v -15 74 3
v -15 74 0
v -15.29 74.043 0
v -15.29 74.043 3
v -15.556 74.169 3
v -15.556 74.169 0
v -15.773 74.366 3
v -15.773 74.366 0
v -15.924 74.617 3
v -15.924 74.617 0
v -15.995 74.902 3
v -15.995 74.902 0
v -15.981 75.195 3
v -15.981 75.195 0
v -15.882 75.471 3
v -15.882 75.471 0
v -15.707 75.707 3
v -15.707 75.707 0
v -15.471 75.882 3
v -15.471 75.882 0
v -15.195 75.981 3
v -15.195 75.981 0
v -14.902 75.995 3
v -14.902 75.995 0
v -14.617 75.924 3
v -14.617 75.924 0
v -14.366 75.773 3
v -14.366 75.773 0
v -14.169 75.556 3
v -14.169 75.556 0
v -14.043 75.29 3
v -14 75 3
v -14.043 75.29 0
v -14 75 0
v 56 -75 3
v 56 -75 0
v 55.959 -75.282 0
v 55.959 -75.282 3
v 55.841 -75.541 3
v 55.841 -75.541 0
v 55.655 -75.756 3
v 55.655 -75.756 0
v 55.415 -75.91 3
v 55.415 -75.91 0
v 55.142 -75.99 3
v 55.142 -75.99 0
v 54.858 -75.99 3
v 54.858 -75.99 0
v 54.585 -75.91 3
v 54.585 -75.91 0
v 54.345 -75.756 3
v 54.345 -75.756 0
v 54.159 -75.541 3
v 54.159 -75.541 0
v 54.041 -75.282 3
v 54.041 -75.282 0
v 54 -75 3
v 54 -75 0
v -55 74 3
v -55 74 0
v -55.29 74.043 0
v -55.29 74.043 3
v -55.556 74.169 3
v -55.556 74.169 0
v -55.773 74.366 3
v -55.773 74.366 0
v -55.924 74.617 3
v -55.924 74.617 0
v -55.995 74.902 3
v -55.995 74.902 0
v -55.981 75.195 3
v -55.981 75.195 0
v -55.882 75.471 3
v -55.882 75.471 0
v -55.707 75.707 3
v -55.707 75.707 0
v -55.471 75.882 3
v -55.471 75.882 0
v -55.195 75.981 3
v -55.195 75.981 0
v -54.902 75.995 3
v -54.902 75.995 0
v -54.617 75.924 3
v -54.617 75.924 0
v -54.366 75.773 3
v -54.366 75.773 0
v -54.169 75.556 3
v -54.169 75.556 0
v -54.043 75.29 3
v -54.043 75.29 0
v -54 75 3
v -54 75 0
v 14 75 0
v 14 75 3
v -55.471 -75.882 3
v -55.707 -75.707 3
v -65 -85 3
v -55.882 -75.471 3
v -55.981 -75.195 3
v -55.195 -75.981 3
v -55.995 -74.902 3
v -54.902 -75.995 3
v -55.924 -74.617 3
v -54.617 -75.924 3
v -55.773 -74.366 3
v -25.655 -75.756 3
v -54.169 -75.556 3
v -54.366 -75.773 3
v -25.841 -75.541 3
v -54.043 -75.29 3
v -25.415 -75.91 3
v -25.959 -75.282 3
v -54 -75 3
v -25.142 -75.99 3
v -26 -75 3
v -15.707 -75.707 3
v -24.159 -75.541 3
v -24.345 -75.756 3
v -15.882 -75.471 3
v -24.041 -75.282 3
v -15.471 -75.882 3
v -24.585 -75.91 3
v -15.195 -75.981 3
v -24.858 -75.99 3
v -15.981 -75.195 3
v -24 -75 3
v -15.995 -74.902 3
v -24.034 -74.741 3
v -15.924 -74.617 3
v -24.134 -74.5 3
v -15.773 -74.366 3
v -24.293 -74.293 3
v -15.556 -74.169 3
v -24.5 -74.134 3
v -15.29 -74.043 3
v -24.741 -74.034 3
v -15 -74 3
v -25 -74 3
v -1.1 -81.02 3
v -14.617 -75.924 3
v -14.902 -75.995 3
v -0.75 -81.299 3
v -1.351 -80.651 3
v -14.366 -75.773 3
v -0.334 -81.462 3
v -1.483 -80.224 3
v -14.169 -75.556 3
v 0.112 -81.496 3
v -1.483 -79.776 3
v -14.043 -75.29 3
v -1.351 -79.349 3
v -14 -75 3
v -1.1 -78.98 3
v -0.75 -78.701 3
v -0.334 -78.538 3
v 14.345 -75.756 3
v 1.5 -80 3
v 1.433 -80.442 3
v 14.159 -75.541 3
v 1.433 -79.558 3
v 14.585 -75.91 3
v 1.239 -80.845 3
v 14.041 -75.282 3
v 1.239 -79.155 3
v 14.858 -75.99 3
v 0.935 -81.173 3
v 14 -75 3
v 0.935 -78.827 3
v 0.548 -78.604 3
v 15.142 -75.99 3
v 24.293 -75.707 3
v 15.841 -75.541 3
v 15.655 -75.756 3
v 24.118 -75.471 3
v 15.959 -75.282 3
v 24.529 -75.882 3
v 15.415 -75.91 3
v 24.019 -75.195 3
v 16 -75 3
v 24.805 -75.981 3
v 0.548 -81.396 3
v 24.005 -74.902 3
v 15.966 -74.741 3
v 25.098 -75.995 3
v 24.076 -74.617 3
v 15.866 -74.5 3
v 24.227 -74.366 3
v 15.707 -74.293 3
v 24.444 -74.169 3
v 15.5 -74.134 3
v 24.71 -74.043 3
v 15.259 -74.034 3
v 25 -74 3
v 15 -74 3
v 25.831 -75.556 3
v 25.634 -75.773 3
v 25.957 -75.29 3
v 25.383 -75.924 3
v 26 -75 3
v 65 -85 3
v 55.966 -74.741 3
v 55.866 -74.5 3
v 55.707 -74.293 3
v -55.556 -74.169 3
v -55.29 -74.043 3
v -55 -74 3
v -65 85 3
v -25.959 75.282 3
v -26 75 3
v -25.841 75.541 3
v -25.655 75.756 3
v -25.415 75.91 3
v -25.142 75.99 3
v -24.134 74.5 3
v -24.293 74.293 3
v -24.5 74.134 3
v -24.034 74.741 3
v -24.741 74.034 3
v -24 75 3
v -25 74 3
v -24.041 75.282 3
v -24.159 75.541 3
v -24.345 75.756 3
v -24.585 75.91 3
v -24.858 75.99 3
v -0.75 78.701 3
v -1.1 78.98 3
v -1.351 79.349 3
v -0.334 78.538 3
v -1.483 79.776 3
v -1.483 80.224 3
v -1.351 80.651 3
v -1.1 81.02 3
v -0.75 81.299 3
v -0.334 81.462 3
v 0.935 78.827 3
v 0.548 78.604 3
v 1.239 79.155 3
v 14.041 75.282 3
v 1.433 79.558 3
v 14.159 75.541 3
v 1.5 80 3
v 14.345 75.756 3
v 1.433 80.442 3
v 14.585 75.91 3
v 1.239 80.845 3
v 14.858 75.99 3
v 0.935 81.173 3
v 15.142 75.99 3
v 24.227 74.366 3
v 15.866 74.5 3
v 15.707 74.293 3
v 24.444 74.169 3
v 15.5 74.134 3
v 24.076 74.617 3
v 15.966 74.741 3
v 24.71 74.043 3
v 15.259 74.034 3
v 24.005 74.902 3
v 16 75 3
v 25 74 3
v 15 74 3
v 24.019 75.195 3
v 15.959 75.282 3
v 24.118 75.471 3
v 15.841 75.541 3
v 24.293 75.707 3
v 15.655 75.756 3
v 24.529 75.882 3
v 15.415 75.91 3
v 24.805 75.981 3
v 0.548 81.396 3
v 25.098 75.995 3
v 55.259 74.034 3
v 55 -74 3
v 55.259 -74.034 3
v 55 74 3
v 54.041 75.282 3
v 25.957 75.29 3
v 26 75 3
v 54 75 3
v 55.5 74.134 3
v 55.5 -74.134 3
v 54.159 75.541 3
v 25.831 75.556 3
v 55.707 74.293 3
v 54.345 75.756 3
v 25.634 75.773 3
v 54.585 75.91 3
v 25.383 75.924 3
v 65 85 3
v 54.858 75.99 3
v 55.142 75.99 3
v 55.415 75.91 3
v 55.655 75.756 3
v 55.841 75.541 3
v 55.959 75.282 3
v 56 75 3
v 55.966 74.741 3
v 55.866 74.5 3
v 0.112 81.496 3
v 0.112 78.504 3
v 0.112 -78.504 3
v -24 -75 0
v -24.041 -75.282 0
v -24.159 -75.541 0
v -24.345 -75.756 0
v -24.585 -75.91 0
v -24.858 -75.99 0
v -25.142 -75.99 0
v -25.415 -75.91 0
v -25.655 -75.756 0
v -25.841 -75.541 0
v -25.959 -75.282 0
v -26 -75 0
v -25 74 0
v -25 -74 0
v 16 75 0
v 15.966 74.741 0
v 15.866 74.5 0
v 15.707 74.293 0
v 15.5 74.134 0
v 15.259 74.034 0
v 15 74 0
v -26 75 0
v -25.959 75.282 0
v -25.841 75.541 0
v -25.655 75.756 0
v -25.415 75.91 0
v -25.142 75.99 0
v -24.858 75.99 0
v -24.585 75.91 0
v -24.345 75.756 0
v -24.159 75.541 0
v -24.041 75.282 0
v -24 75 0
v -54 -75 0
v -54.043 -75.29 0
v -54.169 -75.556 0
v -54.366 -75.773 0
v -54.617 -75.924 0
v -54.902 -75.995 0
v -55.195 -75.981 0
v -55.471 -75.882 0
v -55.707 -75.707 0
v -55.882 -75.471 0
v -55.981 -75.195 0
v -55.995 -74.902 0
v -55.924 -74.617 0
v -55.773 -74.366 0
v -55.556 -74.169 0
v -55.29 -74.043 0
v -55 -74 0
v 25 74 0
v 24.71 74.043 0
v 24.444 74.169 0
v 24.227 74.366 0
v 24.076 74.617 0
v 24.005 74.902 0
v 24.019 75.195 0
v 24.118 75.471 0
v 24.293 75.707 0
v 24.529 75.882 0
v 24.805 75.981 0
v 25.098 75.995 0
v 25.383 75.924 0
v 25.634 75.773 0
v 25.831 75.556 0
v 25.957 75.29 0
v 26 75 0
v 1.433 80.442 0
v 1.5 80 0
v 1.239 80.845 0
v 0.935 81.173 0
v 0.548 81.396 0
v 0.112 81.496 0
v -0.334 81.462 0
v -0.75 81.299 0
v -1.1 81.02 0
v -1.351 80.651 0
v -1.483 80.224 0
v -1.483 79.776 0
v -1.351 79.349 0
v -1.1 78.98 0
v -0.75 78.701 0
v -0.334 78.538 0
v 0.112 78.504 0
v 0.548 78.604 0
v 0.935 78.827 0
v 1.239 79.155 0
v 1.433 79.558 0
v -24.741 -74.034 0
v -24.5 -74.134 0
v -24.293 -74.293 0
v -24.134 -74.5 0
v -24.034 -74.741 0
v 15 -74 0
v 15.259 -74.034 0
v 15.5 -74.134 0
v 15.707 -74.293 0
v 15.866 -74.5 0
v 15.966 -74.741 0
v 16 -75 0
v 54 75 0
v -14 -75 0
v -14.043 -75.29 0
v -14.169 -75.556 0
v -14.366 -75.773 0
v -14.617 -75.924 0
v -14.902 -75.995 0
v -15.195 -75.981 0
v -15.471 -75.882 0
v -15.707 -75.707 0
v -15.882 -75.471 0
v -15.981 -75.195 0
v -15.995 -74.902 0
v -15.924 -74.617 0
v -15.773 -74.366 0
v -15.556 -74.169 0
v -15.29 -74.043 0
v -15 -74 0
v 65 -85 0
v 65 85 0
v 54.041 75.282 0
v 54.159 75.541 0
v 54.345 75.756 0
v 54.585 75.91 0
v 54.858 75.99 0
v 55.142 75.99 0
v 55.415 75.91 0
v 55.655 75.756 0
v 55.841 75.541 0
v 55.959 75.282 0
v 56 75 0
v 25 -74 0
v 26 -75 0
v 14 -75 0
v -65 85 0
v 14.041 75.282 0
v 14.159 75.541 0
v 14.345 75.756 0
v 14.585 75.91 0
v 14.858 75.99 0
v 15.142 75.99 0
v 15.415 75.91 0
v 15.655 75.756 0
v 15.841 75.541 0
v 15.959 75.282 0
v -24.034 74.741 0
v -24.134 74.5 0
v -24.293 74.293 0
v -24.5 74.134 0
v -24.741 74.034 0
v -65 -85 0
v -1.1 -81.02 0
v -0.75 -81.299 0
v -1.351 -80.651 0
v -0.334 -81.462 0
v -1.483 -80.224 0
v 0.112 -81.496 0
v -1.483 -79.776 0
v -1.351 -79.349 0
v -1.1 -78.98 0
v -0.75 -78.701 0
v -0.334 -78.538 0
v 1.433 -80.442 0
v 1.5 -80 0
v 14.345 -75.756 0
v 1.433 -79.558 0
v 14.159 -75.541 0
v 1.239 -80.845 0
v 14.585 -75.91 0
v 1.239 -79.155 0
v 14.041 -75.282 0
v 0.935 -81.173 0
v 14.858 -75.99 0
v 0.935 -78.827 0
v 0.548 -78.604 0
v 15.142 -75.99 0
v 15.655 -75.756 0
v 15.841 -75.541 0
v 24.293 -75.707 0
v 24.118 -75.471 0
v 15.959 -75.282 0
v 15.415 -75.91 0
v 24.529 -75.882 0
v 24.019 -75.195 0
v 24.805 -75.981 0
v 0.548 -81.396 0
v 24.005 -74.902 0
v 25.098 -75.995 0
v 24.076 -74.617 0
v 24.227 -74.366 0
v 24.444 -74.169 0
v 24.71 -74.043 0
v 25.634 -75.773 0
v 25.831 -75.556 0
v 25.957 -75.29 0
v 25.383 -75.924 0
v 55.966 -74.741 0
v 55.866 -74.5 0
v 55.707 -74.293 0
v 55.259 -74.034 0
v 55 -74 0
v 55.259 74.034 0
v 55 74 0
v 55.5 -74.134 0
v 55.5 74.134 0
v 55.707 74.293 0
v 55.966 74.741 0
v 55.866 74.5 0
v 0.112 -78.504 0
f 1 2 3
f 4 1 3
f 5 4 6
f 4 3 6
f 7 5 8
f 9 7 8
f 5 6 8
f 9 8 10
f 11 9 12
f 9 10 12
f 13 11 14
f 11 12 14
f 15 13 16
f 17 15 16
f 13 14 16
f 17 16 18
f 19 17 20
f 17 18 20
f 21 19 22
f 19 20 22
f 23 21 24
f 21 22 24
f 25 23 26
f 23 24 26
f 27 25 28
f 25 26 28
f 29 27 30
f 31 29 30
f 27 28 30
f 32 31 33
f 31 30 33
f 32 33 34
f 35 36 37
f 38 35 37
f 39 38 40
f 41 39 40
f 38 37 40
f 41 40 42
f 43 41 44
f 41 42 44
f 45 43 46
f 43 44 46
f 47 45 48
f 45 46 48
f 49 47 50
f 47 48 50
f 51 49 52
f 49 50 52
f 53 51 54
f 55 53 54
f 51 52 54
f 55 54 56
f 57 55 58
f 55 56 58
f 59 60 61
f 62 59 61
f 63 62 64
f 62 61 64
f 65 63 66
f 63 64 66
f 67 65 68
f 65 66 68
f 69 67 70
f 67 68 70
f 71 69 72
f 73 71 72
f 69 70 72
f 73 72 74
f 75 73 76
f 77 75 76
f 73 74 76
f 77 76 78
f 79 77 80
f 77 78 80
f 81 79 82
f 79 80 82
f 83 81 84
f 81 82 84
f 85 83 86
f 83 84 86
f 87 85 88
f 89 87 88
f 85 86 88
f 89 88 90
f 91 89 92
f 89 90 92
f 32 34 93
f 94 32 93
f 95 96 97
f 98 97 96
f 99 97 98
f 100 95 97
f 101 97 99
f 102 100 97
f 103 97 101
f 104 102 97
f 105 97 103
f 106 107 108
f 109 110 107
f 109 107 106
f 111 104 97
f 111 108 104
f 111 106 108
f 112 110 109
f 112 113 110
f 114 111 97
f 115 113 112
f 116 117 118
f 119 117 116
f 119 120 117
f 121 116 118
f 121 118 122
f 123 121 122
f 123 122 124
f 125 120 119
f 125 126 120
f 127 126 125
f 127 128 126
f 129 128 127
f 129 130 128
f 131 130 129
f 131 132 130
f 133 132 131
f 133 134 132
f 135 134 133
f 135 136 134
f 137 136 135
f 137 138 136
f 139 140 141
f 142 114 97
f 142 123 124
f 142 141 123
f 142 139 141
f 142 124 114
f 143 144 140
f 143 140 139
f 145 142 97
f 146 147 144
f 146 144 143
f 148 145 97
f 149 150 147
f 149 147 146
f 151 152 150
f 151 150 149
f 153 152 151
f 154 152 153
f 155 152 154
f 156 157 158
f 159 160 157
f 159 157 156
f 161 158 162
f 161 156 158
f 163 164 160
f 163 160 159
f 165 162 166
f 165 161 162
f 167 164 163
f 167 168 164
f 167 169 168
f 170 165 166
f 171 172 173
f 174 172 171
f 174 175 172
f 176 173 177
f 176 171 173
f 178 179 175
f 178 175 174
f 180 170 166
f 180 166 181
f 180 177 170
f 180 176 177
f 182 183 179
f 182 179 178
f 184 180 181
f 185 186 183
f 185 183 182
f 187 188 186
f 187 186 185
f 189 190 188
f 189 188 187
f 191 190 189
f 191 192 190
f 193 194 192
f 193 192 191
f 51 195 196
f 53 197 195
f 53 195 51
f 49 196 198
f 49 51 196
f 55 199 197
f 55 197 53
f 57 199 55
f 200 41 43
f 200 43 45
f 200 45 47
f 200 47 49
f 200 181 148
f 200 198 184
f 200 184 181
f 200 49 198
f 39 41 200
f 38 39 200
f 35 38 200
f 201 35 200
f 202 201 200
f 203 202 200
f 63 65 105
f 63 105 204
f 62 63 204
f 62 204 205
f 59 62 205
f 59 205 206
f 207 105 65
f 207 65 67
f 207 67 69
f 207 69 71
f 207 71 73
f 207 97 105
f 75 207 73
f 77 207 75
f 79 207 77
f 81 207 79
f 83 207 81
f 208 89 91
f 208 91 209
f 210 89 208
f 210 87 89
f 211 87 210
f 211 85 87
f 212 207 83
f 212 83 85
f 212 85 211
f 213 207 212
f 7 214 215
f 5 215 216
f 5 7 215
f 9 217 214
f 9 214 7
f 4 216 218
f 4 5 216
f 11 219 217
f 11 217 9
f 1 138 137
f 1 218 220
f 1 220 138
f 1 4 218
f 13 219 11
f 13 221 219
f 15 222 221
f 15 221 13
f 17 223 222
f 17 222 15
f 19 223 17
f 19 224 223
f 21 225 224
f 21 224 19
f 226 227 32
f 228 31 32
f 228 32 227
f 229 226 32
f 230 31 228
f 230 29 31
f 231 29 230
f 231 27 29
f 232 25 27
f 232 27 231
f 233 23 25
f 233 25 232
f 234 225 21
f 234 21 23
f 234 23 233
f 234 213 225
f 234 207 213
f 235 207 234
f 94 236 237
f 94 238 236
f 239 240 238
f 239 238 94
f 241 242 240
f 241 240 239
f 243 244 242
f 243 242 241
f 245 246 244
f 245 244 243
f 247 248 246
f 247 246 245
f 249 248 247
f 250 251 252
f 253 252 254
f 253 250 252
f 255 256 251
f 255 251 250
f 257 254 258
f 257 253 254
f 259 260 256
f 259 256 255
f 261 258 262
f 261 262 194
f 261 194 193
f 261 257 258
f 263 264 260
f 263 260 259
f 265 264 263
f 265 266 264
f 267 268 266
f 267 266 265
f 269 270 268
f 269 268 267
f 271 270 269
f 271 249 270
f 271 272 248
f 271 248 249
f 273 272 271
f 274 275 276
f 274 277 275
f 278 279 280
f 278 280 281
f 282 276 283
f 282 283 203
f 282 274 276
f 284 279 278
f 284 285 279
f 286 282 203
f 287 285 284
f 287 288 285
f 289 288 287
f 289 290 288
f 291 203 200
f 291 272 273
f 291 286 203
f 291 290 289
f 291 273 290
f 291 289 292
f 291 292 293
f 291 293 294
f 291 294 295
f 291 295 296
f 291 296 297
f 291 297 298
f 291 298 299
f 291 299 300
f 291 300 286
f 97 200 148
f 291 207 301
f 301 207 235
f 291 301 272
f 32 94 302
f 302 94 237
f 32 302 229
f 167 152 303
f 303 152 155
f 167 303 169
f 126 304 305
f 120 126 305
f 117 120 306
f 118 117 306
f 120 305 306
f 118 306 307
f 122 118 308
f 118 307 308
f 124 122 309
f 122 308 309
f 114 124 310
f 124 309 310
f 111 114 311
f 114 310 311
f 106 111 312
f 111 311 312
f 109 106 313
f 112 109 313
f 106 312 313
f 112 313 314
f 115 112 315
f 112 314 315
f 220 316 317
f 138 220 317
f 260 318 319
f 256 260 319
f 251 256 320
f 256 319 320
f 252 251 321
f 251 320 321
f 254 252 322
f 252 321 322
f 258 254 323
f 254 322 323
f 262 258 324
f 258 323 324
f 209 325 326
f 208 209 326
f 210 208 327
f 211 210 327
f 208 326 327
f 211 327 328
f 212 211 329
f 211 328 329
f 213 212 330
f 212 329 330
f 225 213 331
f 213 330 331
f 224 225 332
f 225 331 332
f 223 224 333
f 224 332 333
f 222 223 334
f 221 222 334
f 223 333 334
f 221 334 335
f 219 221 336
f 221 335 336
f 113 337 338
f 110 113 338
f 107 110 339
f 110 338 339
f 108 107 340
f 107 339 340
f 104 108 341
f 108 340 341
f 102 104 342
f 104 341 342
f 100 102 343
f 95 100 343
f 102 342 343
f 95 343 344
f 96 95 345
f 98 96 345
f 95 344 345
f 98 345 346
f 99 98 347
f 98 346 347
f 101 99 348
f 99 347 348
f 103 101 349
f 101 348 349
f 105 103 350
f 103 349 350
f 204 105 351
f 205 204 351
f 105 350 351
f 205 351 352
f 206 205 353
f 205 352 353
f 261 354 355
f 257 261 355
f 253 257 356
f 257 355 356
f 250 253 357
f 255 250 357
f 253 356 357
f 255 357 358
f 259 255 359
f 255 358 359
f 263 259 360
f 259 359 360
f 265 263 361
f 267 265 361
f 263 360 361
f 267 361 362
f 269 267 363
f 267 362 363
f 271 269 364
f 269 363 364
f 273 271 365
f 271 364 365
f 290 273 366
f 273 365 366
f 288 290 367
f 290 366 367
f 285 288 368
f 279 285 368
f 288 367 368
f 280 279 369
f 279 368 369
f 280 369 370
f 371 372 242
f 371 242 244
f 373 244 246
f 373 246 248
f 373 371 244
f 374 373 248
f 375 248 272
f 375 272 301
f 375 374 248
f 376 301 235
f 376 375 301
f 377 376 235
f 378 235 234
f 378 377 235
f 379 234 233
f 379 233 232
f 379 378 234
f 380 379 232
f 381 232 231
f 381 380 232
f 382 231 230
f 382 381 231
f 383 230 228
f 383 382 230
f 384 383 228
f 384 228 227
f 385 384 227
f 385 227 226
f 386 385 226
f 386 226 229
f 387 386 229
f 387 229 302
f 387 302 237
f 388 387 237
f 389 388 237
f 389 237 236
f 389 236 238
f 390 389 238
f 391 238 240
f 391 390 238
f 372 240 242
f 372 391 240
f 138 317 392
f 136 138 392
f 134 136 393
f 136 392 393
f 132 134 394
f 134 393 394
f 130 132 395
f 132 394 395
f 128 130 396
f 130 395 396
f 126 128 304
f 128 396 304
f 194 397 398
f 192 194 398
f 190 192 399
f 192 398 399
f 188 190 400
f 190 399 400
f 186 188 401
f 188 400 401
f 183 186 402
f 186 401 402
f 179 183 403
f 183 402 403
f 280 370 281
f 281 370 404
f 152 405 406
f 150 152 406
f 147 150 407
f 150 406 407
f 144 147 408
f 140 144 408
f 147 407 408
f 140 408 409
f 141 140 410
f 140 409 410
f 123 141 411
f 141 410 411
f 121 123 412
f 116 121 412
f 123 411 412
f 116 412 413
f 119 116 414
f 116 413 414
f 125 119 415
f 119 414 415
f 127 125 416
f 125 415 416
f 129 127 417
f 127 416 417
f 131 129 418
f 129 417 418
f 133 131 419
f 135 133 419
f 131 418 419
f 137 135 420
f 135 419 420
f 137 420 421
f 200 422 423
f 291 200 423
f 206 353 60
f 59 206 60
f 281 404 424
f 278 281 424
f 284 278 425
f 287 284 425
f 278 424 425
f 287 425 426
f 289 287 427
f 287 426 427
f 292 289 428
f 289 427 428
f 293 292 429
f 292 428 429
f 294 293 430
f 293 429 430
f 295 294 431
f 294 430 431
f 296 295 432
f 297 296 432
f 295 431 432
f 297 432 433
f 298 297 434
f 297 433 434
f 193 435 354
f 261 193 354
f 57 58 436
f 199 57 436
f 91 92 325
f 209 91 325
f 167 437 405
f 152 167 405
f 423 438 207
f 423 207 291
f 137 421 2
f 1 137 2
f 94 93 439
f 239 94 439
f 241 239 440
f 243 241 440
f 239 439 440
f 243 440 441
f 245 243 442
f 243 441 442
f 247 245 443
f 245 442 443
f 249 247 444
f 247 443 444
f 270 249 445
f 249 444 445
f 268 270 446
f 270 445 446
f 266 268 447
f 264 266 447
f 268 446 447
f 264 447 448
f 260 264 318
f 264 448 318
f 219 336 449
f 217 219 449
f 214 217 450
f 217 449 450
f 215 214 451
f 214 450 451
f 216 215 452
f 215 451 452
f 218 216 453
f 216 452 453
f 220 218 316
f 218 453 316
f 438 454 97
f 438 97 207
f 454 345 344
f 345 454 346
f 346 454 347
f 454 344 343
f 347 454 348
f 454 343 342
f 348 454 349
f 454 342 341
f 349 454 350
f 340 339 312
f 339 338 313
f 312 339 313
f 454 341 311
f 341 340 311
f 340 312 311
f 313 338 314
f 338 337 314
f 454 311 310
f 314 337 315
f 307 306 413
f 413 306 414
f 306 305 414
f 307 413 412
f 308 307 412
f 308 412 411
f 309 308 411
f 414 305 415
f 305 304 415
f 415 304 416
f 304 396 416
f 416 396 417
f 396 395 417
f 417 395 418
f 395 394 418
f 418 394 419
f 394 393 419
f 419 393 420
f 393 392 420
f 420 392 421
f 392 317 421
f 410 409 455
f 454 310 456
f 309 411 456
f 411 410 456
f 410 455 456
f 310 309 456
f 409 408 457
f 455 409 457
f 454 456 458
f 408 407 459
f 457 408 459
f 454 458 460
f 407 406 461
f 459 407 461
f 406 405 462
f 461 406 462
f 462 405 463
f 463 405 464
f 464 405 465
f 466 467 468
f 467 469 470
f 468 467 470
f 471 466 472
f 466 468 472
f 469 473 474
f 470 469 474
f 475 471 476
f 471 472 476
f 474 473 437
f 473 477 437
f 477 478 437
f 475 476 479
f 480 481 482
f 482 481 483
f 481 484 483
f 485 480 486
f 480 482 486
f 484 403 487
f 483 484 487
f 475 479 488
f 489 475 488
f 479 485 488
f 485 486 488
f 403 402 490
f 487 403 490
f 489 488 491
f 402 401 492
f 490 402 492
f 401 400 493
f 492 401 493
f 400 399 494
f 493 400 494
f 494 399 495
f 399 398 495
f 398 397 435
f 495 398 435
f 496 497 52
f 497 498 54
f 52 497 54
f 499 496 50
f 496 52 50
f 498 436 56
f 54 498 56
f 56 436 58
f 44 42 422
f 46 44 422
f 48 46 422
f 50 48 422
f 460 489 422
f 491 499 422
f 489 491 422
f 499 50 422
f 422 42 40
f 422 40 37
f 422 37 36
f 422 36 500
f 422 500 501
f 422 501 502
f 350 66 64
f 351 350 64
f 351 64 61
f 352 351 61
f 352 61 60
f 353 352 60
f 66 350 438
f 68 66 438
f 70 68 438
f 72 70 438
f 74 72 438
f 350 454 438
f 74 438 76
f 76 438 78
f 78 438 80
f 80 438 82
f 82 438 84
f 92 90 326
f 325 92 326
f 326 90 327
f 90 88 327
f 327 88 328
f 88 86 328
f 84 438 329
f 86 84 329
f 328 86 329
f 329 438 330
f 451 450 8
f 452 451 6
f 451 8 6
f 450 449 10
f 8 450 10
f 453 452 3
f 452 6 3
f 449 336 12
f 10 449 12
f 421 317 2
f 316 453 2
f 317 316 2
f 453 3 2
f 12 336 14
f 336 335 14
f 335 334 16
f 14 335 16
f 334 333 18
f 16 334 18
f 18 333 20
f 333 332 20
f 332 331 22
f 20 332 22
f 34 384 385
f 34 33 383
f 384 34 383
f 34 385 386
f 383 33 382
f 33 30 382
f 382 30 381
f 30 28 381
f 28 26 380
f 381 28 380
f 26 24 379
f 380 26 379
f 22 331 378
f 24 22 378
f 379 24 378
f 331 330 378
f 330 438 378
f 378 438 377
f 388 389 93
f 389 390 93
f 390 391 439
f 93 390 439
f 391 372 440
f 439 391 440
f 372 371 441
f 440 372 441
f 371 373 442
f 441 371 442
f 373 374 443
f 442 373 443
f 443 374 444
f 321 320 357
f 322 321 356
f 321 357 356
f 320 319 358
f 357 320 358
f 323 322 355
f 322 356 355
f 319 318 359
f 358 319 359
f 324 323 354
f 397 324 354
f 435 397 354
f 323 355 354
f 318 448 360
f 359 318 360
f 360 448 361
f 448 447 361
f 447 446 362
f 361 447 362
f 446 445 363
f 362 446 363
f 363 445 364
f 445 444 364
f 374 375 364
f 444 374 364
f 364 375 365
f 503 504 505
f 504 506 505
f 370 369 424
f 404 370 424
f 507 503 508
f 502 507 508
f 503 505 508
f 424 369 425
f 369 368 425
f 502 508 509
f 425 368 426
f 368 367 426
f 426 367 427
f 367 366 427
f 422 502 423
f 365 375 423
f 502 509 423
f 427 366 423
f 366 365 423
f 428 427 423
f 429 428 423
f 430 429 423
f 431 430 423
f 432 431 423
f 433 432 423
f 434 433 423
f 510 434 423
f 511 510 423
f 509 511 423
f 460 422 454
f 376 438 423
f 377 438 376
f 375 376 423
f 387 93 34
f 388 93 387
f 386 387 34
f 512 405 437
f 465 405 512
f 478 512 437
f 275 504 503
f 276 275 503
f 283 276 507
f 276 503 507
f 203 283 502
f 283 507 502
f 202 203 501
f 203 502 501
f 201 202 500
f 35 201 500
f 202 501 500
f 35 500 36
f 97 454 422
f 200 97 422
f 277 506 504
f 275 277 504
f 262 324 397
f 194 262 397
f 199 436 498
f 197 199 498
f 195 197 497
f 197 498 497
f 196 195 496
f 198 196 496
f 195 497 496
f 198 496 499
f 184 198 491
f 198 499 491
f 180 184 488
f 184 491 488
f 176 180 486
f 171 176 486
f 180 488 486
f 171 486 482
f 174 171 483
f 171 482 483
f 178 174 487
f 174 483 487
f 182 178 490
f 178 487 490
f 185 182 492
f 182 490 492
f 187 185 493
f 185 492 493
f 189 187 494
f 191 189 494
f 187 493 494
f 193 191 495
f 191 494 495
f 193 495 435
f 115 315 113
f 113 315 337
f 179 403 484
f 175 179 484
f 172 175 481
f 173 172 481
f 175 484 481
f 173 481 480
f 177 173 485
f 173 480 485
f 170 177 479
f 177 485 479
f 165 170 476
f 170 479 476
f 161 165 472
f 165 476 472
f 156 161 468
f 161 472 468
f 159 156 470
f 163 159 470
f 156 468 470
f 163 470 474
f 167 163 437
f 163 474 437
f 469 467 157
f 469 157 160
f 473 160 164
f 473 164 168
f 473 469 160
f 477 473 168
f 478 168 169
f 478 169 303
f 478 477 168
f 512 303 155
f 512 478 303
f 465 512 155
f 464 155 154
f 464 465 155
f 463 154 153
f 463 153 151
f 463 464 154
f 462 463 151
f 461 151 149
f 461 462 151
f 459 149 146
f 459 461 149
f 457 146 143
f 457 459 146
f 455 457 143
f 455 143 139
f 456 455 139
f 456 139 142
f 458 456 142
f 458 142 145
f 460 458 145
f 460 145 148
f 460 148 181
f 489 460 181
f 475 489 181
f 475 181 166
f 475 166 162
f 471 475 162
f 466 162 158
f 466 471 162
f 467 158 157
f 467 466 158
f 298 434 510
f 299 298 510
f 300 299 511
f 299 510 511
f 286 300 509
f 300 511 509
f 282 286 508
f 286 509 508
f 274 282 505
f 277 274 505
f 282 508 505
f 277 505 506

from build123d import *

# Parameters (mm, degrees)
F0_W     = 130
F0_H     = 170
F0_R     = 1.5
F1_DEPTH = 3


with BuildPart() as f1:
    # F0 (on Top) → F1 (new body)
    with BuildSketch(Plane.XY):
        Rectangle(F0_W, F0_H)
        with Locations((0, -80)):
            Circle(F0_R, mode=Mode.SUBTRACT)
        with BuildLine():
            ThreePointArc((-55, 74), (-55.707107, 75.707107), (-54, 75))
            Line((-54, 75), (-26, 75))
            ThreePointArc((-26, 75), (-25, 76), (-24, 75))
            ThreePointArc((-24, 75), (-24.292893, 74.292893), (-25, 74))
            Line((-25, 74), (-25, -74))
            ThreePointArc((-25, -74), (-24.292893, -74.292893), (-24, -75))
            ThreePointArc((-24, -75), (-25, -76), (-26, -75))
            Line((-26, -75), (-54, -75))
            ThreePointArc((-54, -75), (-55.707107, -75.707107), (-55, -74))
            Line((-55, -74), (-55, 74))
        make_face(mode=Mode.SUBTRACT)
        with BuildLine():
            ThreePointArc((-15, 74), (-15.707107, 75.707107), (-14, 75))
            Line((-14, 75), (14, 75))
            ThreePointArc((14, 75), (15, 76), (16, 75))
            ThreePointArc((16, 75), (15.707107, 74.292893), (15, 74))
            Line((15, 74), (15, -74))
            ThreePointArc((15, -74), (15.707107, -74.292893), (16, -75))
            ThreePointArc((16, -75), (15, -76), (14, -75))
            Line((14, -75), (-14, -75))
            ThreePointArc((-14, -75), (-15.707107, -75.707107), (-15, -74))
            Line((-15, -74), (-15, 74))
        make_face(mode=Mode.SUBTRACT)
        with BuildLine():
            ThreePointArc((25, 74), (24.292893, 75.707107), (26, 75))
            Line((26, 75), (54, 75))
            ThreePointArc((54, 75), (55, 76), (56, 75))
            ThreePointArc((56, 75), (55.707107, 74.292893), (55, 74))
            Line((55, 74), (55, -74))
            ThreePointArc((55, -74), (55.707107, -74.292893), (56, -75))
            ThreePointArc((56, -75), (55, -76), (54, -75))
            Line((54, -75), (26, -75))
            ThreePointArc((26, -75), (24.292893, -75.707107), (25, -74))
            Line((25, -74), (25, 74))
        make_face(mode=Mode.SUBTRACT)
        with Locations((0, 80)):
            Circle(F0_R, mode=Mode.SUBTRACT)
    extrude(amount=F1_DEPTH)


solid = f1.part
